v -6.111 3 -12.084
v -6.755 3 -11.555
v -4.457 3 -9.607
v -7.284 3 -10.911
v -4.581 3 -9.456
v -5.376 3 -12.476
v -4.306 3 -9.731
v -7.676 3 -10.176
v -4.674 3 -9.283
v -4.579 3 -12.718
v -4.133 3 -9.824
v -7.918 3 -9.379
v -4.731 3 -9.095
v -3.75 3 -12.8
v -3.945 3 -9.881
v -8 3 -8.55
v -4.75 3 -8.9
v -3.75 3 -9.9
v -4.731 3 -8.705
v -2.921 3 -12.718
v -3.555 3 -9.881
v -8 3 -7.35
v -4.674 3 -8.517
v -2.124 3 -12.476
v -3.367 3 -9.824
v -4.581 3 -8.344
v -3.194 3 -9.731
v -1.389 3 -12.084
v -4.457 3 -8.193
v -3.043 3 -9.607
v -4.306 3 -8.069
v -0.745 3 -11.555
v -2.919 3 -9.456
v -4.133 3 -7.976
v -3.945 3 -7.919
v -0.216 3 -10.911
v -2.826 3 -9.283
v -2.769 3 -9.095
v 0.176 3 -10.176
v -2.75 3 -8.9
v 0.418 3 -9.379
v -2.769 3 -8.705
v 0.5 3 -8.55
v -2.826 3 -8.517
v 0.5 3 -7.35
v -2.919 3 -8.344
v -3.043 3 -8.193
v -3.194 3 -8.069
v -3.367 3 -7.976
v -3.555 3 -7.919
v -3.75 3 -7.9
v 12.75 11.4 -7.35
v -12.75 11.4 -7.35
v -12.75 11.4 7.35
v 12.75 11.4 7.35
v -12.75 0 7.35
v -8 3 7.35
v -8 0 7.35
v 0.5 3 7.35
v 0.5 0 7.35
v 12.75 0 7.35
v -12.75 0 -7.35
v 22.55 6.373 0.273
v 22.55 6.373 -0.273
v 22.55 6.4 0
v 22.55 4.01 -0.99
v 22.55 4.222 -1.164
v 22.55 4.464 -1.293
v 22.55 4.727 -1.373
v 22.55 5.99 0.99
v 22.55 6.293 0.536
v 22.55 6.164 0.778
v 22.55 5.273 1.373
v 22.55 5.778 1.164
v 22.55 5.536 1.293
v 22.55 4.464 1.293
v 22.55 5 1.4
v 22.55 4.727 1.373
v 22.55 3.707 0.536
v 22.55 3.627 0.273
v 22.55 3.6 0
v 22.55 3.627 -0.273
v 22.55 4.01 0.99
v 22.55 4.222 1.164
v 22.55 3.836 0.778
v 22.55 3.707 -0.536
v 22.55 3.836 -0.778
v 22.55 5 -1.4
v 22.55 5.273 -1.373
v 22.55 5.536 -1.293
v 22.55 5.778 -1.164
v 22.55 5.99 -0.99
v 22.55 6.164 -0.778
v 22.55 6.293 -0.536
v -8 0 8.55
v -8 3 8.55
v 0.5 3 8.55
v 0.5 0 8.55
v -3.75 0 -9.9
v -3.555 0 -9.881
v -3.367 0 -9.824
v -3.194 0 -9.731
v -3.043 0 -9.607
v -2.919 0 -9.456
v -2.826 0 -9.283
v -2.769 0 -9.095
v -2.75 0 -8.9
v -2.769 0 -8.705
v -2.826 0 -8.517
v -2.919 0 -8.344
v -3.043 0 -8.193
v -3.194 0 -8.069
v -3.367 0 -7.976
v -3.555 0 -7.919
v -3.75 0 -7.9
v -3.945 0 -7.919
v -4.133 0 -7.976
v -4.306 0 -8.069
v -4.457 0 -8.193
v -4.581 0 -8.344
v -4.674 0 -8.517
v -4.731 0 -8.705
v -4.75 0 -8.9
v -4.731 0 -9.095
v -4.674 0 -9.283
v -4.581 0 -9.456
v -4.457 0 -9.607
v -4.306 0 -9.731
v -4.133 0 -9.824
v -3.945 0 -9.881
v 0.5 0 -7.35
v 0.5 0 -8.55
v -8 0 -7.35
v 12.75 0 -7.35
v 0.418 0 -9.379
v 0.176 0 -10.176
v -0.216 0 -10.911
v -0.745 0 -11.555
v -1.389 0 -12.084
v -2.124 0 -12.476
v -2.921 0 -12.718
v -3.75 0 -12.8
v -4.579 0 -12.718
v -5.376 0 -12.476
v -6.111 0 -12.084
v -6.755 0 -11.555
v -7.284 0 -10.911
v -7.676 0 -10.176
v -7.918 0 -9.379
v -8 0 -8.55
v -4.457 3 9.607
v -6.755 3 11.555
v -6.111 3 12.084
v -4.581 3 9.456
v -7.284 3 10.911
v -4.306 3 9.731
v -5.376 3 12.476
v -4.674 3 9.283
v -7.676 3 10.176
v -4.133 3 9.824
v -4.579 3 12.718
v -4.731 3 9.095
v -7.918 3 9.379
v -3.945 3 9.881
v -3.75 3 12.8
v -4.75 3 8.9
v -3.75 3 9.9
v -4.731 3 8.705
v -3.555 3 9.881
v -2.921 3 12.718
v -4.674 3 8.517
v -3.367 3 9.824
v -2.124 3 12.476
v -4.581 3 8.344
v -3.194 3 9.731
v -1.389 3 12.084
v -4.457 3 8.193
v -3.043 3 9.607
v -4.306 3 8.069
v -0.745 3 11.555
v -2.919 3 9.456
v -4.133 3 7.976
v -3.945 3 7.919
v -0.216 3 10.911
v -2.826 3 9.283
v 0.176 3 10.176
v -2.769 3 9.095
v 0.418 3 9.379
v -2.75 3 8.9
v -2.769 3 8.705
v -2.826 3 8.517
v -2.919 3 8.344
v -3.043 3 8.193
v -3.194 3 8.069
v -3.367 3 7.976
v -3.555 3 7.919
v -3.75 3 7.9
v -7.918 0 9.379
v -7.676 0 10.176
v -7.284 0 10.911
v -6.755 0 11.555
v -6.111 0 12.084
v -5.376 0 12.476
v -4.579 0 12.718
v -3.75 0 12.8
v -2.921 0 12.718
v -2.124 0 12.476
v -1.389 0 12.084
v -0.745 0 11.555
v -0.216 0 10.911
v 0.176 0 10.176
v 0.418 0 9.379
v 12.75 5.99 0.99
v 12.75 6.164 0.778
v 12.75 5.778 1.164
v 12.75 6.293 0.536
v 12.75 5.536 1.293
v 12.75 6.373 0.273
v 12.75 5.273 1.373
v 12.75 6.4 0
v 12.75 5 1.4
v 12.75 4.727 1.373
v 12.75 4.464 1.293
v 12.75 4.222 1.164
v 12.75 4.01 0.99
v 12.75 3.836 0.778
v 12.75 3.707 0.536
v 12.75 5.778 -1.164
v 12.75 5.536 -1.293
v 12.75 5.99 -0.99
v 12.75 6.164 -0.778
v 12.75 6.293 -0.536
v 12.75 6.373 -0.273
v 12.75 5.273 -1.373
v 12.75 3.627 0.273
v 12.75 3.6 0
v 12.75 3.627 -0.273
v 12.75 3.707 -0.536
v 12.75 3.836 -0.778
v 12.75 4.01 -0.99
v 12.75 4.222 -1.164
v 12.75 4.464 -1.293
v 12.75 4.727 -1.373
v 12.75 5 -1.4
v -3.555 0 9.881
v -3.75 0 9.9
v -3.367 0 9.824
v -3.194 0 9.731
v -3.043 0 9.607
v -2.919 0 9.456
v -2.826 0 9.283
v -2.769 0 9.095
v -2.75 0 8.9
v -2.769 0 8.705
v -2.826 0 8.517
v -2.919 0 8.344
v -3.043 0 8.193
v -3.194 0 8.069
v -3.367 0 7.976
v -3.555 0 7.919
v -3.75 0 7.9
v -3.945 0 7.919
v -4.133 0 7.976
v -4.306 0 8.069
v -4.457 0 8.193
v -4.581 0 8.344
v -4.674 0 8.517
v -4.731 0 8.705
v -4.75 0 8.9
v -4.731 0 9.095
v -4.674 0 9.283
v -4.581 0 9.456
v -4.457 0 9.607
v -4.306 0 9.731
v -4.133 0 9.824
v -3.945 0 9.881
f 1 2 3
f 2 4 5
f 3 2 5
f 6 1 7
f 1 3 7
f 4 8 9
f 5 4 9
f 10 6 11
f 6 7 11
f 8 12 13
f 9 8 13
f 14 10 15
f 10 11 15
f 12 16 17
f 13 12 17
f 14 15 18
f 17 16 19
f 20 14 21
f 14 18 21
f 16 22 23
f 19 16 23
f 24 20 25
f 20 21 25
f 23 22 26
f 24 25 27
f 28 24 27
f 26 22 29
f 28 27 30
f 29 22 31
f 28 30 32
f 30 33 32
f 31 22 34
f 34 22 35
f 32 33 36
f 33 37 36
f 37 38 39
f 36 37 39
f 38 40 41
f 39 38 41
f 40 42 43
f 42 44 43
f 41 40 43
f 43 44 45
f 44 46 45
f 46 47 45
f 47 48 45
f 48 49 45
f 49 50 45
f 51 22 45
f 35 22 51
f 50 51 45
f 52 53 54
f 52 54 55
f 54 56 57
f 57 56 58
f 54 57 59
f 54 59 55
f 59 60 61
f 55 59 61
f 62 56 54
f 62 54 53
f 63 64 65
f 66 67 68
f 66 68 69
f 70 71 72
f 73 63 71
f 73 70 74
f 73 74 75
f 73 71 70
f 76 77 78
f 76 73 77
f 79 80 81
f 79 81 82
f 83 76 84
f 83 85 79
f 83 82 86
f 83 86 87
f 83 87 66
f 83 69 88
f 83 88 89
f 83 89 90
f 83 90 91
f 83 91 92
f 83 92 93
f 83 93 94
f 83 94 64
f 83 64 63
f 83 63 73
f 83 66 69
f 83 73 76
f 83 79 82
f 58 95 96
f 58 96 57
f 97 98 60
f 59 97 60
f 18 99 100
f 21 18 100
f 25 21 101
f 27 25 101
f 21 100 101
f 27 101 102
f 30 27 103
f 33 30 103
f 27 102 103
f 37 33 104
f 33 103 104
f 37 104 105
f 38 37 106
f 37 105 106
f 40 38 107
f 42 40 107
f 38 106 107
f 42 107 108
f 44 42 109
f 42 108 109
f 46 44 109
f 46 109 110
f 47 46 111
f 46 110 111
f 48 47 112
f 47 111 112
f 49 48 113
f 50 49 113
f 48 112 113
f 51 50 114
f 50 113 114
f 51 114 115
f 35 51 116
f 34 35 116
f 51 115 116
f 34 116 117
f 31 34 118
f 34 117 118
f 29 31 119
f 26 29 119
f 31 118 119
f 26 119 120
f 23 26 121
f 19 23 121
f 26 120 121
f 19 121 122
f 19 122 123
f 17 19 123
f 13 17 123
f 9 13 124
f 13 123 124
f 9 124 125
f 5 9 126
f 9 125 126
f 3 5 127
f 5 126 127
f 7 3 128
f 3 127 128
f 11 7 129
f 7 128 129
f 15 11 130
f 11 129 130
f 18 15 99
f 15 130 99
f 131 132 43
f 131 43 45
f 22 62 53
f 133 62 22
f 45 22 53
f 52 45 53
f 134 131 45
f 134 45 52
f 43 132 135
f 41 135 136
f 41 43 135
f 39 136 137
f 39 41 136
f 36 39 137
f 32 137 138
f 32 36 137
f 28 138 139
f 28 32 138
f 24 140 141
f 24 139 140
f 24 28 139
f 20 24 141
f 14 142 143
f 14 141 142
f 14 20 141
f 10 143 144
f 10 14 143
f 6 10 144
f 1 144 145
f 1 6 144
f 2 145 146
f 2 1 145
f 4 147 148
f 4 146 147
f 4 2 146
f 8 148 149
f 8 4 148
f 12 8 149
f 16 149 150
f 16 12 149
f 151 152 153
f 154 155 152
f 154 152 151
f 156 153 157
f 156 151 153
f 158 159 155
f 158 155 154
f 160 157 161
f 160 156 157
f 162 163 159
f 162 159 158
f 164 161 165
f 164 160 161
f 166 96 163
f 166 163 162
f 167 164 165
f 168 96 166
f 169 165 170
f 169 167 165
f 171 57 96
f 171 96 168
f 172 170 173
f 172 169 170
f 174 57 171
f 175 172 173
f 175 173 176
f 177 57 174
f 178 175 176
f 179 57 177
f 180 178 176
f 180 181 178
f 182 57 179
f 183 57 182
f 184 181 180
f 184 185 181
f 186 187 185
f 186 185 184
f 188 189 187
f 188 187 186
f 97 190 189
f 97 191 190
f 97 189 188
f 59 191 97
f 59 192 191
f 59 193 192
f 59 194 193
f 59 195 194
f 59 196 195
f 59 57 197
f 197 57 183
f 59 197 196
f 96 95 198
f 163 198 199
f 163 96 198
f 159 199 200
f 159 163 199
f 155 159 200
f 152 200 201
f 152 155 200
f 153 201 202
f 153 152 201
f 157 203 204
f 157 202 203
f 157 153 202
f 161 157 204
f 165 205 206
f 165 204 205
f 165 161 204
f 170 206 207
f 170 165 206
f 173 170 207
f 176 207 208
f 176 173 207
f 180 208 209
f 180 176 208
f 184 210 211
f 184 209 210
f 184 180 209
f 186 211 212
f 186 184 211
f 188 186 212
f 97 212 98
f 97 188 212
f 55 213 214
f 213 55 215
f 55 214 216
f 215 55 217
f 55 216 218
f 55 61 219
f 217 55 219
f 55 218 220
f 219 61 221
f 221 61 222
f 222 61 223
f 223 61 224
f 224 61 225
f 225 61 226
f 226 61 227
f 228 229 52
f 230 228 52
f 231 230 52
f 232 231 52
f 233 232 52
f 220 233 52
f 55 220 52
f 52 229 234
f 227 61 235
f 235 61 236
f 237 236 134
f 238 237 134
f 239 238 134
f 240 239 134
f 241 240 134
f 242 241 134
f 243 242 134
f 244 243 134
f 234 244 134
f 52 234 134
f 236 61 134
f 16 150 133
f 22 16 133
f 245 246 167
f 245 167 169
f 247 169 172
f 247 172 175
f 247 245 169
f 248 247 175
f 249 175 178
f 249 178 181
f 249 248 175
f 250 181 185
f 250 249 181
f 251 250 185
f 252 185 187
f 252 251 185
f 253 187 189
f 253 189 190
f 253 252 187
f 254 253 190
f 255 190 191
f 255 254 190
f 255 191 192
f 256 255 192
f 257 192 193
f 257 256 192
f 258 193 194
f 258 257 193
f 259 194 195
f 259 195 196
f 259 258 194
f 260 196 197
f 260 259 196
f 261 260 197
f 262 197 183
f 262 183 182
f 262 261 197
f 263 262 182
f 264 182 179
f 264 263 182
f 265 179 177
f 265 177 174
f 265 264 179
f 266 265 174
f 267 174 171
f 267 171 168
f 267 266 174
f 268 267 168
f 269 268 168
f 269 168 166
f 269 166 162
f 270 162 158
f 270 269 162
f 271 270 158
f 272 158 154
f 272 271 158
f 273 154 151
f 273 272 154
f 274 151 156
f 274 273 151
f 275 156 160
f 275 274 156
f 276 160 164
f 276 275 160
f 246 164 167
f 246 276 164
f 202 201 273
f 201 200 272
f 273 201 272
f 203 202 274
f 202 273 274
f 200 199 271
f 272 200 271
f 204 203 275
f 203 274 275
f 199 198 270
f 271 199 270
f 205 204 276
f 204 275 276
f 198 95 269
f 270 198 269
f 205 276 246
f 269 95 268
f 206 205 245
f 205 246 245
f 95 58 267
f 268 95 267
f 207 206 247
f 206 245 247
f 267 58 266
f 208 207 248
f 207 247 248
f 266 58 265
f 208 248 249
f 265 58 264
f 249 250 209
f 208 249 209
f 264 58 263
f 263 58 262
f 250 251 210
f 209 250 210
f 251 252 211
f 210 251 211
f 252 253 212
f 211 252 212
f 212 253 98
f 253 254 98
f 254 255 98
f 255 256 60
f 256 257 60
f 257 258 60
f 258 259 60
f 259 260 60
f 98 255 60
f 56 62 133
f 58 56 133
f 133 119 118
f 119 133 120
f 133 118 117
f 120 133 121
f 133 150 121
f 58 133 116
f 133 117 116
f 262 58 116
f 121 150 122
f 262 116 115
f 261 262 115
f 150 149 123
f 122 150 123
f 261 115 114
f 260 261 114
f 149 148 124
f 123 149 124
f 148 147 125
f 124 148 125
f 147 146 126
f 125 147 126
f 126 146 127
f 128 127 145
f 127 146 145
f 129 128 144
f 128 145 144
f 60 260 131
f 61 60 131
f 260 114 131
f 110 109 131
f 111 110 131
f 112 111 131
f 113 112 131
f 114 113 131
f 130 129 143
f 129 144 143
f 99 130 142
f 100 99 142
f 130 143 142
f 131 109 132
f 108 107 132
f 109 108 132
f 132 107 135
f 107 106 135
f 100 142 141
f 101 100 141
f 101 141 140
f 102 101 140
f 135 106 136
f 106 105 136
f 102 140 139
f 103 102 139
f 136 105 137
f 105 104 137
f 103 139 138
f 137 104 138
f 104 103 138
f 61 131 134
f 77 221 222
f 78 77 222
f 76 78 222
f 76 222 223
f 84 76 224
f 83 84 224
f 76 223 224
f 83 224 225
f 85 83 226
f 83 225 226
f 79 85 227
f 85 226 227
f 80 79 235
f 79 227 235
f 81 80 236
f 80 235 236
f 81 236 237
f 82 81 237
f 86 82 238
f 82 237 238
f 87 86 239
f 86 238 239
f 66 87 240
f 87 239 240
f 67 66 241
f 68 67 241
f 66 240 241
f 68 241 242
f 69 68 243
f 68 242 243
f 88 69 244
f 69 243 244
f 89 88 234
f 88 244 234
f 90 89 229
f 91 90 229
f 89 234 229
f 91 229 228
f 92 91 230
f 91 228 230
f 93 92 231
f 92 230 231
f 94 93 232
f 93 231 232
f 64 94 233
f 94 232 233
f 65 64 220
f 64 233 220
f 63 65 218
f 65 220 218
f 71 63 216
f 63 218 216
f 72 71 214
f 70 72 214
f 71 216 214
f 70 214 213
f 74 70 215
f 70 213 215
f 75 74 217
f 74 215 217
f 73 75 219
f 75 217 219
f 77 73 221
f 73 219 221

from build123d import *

# Parameters (mm, degrees)
SKETCH_1_W                    = 25.5
SKETCH_1_H                    = 14.7
EXTRUDE_263_DEPTH             = 11.4
SKETCH_2_R                    = 1.4
EXTRUDE_429_DEPTH             = 9.8
SKETCH_3_W                    = 8.5
SKETCH_3_H                    = 5.45
SKETCH_3_R                    = 1
EXTRUDE_694_DEPTH             = 3
FILLET_3_RADIUS               = 4.25
FILLET_3_LENGTH               = 3
FILLET_3_OF_MIRROR_3_2_RADIUS = 4.25
FILLET_3_OF_MIRROR_3_2_LENGTH = 3


with BuildPart() as part:
    # 草图1 → Extrude 263 (new body)
    with BuildSketch(Plane(origin=(0, 0, 0), x_dir=(1, 0, 0), z_dir=(0, 1, 0))):
        Rectangle(SKETCH_1_W, SKETCH_1_H)
    extrude(amount=EXTRUDE_263_DEPTH)

    # 草图2 → Extrude 429 (add)
    with BuildSketch(Plane(origin=(12.75, 0, 0), x_dir=(0, 0, -1), z_dir=(1, 0, 0))):
        with Locations(Location((0, 5, 0), (0, 0, 180))):
            Circle(SKETCH_2_R)
    extrude(amount=EXTRUDE_429_DEPTH)

    # 草图3 → Extrude 694 (add)
    with BuildSketch(Plane.XZ):
        with Locations((-3.75, -10.075)):
            Rectangle(SKETCH_3_W, SKETCH_3_H)
        with Locations(Location((-3.75, -8.9, 0), (0, 0, 270))):
            Circle(SKETCH_3_R, mode=Mode.SUBTRACT)
    extrude_694 = extrude(amount=-EXTRUDE_694_DEPTH)

    # 圆角3: full round fillet: the end face becomes a half cylinder, R = half its width
    fillet_3_face = Plane((-3.75, 1.5, -12.8), x_dir=(0, 1, 0), z_dir=(0, 0, -1))  # on the end face: x along it, z out of the body
    fillet_3_slab = fillet_3_face.offset(-FILLET_3_RADIUS / 2) * Box(FILLET_3_LENGTH, 2 * FILLET_3_RADIUS, FILLET_3_RADIUS, mode=Mode.PRIVATE)  # the body's end, R deep
    fillet_3_round = Plane((-3.75, 1.5, -8.55), x_dir=(0, 0, -1), z_dir=(0, 1, 0)) * Cylinder(FILLET_3_RADIUS, FILLET_3_LENGTH, mode=Mode.PRIVATE)  # its axis R under the face
    add(fillet_3_slab - fillet_3_round, mode=Mode.SUBTRACT)

    # 镜向3: Extrude 694 across plane
    add(extrude_694.mirror(Plane.XY))

    # 圆角3 of Mirror 3 2: full round fillet: the end face becomes a half cylinder, R = half its width
    fillet_3_of_mirror_3_2_face = Plane((-3.75, 1.5, 12.8), x_dir=(0, 1, 0), z_dir=(0, 0, 1))  # on the end face: x along it, z out of the body
    fillet_3_of_mirror_3_2_slab = fillet_3_of_mirror_3_2_face.offset(-FILLET_3_OF_MIRROR_3_2_RADIUS / 2) * Box(FILLET_3_OF_MIRROR_3_2_LENGTH, 2 * FILLET_3_OF_MIRROR_3_2_RADIUS, FILLET_3_OF_MIRROR_3_2_RADIUS, mode=Mode.PRIVATE)  # the body's end, R deep
    fillet_3_of_mirror_3_2_round = Plane((-3.75, 1.5, 8.55), x_dir=(0, 0, 1), z_dir=(0, 1, 0)) * Cylinder(FILLET_3_OF_MIRROR_3_2_RADIUS, FILLET_3_OF_MIRROR_3_2_LENGTH, mode=Mode.PRIVATE)  # its axis R under the face
    add(fillet_3_of_mirror_3_2_slab - fillet_3_of_mirror_3_2_round, mode=Mode.SUBTRACT)


solid = part.part
